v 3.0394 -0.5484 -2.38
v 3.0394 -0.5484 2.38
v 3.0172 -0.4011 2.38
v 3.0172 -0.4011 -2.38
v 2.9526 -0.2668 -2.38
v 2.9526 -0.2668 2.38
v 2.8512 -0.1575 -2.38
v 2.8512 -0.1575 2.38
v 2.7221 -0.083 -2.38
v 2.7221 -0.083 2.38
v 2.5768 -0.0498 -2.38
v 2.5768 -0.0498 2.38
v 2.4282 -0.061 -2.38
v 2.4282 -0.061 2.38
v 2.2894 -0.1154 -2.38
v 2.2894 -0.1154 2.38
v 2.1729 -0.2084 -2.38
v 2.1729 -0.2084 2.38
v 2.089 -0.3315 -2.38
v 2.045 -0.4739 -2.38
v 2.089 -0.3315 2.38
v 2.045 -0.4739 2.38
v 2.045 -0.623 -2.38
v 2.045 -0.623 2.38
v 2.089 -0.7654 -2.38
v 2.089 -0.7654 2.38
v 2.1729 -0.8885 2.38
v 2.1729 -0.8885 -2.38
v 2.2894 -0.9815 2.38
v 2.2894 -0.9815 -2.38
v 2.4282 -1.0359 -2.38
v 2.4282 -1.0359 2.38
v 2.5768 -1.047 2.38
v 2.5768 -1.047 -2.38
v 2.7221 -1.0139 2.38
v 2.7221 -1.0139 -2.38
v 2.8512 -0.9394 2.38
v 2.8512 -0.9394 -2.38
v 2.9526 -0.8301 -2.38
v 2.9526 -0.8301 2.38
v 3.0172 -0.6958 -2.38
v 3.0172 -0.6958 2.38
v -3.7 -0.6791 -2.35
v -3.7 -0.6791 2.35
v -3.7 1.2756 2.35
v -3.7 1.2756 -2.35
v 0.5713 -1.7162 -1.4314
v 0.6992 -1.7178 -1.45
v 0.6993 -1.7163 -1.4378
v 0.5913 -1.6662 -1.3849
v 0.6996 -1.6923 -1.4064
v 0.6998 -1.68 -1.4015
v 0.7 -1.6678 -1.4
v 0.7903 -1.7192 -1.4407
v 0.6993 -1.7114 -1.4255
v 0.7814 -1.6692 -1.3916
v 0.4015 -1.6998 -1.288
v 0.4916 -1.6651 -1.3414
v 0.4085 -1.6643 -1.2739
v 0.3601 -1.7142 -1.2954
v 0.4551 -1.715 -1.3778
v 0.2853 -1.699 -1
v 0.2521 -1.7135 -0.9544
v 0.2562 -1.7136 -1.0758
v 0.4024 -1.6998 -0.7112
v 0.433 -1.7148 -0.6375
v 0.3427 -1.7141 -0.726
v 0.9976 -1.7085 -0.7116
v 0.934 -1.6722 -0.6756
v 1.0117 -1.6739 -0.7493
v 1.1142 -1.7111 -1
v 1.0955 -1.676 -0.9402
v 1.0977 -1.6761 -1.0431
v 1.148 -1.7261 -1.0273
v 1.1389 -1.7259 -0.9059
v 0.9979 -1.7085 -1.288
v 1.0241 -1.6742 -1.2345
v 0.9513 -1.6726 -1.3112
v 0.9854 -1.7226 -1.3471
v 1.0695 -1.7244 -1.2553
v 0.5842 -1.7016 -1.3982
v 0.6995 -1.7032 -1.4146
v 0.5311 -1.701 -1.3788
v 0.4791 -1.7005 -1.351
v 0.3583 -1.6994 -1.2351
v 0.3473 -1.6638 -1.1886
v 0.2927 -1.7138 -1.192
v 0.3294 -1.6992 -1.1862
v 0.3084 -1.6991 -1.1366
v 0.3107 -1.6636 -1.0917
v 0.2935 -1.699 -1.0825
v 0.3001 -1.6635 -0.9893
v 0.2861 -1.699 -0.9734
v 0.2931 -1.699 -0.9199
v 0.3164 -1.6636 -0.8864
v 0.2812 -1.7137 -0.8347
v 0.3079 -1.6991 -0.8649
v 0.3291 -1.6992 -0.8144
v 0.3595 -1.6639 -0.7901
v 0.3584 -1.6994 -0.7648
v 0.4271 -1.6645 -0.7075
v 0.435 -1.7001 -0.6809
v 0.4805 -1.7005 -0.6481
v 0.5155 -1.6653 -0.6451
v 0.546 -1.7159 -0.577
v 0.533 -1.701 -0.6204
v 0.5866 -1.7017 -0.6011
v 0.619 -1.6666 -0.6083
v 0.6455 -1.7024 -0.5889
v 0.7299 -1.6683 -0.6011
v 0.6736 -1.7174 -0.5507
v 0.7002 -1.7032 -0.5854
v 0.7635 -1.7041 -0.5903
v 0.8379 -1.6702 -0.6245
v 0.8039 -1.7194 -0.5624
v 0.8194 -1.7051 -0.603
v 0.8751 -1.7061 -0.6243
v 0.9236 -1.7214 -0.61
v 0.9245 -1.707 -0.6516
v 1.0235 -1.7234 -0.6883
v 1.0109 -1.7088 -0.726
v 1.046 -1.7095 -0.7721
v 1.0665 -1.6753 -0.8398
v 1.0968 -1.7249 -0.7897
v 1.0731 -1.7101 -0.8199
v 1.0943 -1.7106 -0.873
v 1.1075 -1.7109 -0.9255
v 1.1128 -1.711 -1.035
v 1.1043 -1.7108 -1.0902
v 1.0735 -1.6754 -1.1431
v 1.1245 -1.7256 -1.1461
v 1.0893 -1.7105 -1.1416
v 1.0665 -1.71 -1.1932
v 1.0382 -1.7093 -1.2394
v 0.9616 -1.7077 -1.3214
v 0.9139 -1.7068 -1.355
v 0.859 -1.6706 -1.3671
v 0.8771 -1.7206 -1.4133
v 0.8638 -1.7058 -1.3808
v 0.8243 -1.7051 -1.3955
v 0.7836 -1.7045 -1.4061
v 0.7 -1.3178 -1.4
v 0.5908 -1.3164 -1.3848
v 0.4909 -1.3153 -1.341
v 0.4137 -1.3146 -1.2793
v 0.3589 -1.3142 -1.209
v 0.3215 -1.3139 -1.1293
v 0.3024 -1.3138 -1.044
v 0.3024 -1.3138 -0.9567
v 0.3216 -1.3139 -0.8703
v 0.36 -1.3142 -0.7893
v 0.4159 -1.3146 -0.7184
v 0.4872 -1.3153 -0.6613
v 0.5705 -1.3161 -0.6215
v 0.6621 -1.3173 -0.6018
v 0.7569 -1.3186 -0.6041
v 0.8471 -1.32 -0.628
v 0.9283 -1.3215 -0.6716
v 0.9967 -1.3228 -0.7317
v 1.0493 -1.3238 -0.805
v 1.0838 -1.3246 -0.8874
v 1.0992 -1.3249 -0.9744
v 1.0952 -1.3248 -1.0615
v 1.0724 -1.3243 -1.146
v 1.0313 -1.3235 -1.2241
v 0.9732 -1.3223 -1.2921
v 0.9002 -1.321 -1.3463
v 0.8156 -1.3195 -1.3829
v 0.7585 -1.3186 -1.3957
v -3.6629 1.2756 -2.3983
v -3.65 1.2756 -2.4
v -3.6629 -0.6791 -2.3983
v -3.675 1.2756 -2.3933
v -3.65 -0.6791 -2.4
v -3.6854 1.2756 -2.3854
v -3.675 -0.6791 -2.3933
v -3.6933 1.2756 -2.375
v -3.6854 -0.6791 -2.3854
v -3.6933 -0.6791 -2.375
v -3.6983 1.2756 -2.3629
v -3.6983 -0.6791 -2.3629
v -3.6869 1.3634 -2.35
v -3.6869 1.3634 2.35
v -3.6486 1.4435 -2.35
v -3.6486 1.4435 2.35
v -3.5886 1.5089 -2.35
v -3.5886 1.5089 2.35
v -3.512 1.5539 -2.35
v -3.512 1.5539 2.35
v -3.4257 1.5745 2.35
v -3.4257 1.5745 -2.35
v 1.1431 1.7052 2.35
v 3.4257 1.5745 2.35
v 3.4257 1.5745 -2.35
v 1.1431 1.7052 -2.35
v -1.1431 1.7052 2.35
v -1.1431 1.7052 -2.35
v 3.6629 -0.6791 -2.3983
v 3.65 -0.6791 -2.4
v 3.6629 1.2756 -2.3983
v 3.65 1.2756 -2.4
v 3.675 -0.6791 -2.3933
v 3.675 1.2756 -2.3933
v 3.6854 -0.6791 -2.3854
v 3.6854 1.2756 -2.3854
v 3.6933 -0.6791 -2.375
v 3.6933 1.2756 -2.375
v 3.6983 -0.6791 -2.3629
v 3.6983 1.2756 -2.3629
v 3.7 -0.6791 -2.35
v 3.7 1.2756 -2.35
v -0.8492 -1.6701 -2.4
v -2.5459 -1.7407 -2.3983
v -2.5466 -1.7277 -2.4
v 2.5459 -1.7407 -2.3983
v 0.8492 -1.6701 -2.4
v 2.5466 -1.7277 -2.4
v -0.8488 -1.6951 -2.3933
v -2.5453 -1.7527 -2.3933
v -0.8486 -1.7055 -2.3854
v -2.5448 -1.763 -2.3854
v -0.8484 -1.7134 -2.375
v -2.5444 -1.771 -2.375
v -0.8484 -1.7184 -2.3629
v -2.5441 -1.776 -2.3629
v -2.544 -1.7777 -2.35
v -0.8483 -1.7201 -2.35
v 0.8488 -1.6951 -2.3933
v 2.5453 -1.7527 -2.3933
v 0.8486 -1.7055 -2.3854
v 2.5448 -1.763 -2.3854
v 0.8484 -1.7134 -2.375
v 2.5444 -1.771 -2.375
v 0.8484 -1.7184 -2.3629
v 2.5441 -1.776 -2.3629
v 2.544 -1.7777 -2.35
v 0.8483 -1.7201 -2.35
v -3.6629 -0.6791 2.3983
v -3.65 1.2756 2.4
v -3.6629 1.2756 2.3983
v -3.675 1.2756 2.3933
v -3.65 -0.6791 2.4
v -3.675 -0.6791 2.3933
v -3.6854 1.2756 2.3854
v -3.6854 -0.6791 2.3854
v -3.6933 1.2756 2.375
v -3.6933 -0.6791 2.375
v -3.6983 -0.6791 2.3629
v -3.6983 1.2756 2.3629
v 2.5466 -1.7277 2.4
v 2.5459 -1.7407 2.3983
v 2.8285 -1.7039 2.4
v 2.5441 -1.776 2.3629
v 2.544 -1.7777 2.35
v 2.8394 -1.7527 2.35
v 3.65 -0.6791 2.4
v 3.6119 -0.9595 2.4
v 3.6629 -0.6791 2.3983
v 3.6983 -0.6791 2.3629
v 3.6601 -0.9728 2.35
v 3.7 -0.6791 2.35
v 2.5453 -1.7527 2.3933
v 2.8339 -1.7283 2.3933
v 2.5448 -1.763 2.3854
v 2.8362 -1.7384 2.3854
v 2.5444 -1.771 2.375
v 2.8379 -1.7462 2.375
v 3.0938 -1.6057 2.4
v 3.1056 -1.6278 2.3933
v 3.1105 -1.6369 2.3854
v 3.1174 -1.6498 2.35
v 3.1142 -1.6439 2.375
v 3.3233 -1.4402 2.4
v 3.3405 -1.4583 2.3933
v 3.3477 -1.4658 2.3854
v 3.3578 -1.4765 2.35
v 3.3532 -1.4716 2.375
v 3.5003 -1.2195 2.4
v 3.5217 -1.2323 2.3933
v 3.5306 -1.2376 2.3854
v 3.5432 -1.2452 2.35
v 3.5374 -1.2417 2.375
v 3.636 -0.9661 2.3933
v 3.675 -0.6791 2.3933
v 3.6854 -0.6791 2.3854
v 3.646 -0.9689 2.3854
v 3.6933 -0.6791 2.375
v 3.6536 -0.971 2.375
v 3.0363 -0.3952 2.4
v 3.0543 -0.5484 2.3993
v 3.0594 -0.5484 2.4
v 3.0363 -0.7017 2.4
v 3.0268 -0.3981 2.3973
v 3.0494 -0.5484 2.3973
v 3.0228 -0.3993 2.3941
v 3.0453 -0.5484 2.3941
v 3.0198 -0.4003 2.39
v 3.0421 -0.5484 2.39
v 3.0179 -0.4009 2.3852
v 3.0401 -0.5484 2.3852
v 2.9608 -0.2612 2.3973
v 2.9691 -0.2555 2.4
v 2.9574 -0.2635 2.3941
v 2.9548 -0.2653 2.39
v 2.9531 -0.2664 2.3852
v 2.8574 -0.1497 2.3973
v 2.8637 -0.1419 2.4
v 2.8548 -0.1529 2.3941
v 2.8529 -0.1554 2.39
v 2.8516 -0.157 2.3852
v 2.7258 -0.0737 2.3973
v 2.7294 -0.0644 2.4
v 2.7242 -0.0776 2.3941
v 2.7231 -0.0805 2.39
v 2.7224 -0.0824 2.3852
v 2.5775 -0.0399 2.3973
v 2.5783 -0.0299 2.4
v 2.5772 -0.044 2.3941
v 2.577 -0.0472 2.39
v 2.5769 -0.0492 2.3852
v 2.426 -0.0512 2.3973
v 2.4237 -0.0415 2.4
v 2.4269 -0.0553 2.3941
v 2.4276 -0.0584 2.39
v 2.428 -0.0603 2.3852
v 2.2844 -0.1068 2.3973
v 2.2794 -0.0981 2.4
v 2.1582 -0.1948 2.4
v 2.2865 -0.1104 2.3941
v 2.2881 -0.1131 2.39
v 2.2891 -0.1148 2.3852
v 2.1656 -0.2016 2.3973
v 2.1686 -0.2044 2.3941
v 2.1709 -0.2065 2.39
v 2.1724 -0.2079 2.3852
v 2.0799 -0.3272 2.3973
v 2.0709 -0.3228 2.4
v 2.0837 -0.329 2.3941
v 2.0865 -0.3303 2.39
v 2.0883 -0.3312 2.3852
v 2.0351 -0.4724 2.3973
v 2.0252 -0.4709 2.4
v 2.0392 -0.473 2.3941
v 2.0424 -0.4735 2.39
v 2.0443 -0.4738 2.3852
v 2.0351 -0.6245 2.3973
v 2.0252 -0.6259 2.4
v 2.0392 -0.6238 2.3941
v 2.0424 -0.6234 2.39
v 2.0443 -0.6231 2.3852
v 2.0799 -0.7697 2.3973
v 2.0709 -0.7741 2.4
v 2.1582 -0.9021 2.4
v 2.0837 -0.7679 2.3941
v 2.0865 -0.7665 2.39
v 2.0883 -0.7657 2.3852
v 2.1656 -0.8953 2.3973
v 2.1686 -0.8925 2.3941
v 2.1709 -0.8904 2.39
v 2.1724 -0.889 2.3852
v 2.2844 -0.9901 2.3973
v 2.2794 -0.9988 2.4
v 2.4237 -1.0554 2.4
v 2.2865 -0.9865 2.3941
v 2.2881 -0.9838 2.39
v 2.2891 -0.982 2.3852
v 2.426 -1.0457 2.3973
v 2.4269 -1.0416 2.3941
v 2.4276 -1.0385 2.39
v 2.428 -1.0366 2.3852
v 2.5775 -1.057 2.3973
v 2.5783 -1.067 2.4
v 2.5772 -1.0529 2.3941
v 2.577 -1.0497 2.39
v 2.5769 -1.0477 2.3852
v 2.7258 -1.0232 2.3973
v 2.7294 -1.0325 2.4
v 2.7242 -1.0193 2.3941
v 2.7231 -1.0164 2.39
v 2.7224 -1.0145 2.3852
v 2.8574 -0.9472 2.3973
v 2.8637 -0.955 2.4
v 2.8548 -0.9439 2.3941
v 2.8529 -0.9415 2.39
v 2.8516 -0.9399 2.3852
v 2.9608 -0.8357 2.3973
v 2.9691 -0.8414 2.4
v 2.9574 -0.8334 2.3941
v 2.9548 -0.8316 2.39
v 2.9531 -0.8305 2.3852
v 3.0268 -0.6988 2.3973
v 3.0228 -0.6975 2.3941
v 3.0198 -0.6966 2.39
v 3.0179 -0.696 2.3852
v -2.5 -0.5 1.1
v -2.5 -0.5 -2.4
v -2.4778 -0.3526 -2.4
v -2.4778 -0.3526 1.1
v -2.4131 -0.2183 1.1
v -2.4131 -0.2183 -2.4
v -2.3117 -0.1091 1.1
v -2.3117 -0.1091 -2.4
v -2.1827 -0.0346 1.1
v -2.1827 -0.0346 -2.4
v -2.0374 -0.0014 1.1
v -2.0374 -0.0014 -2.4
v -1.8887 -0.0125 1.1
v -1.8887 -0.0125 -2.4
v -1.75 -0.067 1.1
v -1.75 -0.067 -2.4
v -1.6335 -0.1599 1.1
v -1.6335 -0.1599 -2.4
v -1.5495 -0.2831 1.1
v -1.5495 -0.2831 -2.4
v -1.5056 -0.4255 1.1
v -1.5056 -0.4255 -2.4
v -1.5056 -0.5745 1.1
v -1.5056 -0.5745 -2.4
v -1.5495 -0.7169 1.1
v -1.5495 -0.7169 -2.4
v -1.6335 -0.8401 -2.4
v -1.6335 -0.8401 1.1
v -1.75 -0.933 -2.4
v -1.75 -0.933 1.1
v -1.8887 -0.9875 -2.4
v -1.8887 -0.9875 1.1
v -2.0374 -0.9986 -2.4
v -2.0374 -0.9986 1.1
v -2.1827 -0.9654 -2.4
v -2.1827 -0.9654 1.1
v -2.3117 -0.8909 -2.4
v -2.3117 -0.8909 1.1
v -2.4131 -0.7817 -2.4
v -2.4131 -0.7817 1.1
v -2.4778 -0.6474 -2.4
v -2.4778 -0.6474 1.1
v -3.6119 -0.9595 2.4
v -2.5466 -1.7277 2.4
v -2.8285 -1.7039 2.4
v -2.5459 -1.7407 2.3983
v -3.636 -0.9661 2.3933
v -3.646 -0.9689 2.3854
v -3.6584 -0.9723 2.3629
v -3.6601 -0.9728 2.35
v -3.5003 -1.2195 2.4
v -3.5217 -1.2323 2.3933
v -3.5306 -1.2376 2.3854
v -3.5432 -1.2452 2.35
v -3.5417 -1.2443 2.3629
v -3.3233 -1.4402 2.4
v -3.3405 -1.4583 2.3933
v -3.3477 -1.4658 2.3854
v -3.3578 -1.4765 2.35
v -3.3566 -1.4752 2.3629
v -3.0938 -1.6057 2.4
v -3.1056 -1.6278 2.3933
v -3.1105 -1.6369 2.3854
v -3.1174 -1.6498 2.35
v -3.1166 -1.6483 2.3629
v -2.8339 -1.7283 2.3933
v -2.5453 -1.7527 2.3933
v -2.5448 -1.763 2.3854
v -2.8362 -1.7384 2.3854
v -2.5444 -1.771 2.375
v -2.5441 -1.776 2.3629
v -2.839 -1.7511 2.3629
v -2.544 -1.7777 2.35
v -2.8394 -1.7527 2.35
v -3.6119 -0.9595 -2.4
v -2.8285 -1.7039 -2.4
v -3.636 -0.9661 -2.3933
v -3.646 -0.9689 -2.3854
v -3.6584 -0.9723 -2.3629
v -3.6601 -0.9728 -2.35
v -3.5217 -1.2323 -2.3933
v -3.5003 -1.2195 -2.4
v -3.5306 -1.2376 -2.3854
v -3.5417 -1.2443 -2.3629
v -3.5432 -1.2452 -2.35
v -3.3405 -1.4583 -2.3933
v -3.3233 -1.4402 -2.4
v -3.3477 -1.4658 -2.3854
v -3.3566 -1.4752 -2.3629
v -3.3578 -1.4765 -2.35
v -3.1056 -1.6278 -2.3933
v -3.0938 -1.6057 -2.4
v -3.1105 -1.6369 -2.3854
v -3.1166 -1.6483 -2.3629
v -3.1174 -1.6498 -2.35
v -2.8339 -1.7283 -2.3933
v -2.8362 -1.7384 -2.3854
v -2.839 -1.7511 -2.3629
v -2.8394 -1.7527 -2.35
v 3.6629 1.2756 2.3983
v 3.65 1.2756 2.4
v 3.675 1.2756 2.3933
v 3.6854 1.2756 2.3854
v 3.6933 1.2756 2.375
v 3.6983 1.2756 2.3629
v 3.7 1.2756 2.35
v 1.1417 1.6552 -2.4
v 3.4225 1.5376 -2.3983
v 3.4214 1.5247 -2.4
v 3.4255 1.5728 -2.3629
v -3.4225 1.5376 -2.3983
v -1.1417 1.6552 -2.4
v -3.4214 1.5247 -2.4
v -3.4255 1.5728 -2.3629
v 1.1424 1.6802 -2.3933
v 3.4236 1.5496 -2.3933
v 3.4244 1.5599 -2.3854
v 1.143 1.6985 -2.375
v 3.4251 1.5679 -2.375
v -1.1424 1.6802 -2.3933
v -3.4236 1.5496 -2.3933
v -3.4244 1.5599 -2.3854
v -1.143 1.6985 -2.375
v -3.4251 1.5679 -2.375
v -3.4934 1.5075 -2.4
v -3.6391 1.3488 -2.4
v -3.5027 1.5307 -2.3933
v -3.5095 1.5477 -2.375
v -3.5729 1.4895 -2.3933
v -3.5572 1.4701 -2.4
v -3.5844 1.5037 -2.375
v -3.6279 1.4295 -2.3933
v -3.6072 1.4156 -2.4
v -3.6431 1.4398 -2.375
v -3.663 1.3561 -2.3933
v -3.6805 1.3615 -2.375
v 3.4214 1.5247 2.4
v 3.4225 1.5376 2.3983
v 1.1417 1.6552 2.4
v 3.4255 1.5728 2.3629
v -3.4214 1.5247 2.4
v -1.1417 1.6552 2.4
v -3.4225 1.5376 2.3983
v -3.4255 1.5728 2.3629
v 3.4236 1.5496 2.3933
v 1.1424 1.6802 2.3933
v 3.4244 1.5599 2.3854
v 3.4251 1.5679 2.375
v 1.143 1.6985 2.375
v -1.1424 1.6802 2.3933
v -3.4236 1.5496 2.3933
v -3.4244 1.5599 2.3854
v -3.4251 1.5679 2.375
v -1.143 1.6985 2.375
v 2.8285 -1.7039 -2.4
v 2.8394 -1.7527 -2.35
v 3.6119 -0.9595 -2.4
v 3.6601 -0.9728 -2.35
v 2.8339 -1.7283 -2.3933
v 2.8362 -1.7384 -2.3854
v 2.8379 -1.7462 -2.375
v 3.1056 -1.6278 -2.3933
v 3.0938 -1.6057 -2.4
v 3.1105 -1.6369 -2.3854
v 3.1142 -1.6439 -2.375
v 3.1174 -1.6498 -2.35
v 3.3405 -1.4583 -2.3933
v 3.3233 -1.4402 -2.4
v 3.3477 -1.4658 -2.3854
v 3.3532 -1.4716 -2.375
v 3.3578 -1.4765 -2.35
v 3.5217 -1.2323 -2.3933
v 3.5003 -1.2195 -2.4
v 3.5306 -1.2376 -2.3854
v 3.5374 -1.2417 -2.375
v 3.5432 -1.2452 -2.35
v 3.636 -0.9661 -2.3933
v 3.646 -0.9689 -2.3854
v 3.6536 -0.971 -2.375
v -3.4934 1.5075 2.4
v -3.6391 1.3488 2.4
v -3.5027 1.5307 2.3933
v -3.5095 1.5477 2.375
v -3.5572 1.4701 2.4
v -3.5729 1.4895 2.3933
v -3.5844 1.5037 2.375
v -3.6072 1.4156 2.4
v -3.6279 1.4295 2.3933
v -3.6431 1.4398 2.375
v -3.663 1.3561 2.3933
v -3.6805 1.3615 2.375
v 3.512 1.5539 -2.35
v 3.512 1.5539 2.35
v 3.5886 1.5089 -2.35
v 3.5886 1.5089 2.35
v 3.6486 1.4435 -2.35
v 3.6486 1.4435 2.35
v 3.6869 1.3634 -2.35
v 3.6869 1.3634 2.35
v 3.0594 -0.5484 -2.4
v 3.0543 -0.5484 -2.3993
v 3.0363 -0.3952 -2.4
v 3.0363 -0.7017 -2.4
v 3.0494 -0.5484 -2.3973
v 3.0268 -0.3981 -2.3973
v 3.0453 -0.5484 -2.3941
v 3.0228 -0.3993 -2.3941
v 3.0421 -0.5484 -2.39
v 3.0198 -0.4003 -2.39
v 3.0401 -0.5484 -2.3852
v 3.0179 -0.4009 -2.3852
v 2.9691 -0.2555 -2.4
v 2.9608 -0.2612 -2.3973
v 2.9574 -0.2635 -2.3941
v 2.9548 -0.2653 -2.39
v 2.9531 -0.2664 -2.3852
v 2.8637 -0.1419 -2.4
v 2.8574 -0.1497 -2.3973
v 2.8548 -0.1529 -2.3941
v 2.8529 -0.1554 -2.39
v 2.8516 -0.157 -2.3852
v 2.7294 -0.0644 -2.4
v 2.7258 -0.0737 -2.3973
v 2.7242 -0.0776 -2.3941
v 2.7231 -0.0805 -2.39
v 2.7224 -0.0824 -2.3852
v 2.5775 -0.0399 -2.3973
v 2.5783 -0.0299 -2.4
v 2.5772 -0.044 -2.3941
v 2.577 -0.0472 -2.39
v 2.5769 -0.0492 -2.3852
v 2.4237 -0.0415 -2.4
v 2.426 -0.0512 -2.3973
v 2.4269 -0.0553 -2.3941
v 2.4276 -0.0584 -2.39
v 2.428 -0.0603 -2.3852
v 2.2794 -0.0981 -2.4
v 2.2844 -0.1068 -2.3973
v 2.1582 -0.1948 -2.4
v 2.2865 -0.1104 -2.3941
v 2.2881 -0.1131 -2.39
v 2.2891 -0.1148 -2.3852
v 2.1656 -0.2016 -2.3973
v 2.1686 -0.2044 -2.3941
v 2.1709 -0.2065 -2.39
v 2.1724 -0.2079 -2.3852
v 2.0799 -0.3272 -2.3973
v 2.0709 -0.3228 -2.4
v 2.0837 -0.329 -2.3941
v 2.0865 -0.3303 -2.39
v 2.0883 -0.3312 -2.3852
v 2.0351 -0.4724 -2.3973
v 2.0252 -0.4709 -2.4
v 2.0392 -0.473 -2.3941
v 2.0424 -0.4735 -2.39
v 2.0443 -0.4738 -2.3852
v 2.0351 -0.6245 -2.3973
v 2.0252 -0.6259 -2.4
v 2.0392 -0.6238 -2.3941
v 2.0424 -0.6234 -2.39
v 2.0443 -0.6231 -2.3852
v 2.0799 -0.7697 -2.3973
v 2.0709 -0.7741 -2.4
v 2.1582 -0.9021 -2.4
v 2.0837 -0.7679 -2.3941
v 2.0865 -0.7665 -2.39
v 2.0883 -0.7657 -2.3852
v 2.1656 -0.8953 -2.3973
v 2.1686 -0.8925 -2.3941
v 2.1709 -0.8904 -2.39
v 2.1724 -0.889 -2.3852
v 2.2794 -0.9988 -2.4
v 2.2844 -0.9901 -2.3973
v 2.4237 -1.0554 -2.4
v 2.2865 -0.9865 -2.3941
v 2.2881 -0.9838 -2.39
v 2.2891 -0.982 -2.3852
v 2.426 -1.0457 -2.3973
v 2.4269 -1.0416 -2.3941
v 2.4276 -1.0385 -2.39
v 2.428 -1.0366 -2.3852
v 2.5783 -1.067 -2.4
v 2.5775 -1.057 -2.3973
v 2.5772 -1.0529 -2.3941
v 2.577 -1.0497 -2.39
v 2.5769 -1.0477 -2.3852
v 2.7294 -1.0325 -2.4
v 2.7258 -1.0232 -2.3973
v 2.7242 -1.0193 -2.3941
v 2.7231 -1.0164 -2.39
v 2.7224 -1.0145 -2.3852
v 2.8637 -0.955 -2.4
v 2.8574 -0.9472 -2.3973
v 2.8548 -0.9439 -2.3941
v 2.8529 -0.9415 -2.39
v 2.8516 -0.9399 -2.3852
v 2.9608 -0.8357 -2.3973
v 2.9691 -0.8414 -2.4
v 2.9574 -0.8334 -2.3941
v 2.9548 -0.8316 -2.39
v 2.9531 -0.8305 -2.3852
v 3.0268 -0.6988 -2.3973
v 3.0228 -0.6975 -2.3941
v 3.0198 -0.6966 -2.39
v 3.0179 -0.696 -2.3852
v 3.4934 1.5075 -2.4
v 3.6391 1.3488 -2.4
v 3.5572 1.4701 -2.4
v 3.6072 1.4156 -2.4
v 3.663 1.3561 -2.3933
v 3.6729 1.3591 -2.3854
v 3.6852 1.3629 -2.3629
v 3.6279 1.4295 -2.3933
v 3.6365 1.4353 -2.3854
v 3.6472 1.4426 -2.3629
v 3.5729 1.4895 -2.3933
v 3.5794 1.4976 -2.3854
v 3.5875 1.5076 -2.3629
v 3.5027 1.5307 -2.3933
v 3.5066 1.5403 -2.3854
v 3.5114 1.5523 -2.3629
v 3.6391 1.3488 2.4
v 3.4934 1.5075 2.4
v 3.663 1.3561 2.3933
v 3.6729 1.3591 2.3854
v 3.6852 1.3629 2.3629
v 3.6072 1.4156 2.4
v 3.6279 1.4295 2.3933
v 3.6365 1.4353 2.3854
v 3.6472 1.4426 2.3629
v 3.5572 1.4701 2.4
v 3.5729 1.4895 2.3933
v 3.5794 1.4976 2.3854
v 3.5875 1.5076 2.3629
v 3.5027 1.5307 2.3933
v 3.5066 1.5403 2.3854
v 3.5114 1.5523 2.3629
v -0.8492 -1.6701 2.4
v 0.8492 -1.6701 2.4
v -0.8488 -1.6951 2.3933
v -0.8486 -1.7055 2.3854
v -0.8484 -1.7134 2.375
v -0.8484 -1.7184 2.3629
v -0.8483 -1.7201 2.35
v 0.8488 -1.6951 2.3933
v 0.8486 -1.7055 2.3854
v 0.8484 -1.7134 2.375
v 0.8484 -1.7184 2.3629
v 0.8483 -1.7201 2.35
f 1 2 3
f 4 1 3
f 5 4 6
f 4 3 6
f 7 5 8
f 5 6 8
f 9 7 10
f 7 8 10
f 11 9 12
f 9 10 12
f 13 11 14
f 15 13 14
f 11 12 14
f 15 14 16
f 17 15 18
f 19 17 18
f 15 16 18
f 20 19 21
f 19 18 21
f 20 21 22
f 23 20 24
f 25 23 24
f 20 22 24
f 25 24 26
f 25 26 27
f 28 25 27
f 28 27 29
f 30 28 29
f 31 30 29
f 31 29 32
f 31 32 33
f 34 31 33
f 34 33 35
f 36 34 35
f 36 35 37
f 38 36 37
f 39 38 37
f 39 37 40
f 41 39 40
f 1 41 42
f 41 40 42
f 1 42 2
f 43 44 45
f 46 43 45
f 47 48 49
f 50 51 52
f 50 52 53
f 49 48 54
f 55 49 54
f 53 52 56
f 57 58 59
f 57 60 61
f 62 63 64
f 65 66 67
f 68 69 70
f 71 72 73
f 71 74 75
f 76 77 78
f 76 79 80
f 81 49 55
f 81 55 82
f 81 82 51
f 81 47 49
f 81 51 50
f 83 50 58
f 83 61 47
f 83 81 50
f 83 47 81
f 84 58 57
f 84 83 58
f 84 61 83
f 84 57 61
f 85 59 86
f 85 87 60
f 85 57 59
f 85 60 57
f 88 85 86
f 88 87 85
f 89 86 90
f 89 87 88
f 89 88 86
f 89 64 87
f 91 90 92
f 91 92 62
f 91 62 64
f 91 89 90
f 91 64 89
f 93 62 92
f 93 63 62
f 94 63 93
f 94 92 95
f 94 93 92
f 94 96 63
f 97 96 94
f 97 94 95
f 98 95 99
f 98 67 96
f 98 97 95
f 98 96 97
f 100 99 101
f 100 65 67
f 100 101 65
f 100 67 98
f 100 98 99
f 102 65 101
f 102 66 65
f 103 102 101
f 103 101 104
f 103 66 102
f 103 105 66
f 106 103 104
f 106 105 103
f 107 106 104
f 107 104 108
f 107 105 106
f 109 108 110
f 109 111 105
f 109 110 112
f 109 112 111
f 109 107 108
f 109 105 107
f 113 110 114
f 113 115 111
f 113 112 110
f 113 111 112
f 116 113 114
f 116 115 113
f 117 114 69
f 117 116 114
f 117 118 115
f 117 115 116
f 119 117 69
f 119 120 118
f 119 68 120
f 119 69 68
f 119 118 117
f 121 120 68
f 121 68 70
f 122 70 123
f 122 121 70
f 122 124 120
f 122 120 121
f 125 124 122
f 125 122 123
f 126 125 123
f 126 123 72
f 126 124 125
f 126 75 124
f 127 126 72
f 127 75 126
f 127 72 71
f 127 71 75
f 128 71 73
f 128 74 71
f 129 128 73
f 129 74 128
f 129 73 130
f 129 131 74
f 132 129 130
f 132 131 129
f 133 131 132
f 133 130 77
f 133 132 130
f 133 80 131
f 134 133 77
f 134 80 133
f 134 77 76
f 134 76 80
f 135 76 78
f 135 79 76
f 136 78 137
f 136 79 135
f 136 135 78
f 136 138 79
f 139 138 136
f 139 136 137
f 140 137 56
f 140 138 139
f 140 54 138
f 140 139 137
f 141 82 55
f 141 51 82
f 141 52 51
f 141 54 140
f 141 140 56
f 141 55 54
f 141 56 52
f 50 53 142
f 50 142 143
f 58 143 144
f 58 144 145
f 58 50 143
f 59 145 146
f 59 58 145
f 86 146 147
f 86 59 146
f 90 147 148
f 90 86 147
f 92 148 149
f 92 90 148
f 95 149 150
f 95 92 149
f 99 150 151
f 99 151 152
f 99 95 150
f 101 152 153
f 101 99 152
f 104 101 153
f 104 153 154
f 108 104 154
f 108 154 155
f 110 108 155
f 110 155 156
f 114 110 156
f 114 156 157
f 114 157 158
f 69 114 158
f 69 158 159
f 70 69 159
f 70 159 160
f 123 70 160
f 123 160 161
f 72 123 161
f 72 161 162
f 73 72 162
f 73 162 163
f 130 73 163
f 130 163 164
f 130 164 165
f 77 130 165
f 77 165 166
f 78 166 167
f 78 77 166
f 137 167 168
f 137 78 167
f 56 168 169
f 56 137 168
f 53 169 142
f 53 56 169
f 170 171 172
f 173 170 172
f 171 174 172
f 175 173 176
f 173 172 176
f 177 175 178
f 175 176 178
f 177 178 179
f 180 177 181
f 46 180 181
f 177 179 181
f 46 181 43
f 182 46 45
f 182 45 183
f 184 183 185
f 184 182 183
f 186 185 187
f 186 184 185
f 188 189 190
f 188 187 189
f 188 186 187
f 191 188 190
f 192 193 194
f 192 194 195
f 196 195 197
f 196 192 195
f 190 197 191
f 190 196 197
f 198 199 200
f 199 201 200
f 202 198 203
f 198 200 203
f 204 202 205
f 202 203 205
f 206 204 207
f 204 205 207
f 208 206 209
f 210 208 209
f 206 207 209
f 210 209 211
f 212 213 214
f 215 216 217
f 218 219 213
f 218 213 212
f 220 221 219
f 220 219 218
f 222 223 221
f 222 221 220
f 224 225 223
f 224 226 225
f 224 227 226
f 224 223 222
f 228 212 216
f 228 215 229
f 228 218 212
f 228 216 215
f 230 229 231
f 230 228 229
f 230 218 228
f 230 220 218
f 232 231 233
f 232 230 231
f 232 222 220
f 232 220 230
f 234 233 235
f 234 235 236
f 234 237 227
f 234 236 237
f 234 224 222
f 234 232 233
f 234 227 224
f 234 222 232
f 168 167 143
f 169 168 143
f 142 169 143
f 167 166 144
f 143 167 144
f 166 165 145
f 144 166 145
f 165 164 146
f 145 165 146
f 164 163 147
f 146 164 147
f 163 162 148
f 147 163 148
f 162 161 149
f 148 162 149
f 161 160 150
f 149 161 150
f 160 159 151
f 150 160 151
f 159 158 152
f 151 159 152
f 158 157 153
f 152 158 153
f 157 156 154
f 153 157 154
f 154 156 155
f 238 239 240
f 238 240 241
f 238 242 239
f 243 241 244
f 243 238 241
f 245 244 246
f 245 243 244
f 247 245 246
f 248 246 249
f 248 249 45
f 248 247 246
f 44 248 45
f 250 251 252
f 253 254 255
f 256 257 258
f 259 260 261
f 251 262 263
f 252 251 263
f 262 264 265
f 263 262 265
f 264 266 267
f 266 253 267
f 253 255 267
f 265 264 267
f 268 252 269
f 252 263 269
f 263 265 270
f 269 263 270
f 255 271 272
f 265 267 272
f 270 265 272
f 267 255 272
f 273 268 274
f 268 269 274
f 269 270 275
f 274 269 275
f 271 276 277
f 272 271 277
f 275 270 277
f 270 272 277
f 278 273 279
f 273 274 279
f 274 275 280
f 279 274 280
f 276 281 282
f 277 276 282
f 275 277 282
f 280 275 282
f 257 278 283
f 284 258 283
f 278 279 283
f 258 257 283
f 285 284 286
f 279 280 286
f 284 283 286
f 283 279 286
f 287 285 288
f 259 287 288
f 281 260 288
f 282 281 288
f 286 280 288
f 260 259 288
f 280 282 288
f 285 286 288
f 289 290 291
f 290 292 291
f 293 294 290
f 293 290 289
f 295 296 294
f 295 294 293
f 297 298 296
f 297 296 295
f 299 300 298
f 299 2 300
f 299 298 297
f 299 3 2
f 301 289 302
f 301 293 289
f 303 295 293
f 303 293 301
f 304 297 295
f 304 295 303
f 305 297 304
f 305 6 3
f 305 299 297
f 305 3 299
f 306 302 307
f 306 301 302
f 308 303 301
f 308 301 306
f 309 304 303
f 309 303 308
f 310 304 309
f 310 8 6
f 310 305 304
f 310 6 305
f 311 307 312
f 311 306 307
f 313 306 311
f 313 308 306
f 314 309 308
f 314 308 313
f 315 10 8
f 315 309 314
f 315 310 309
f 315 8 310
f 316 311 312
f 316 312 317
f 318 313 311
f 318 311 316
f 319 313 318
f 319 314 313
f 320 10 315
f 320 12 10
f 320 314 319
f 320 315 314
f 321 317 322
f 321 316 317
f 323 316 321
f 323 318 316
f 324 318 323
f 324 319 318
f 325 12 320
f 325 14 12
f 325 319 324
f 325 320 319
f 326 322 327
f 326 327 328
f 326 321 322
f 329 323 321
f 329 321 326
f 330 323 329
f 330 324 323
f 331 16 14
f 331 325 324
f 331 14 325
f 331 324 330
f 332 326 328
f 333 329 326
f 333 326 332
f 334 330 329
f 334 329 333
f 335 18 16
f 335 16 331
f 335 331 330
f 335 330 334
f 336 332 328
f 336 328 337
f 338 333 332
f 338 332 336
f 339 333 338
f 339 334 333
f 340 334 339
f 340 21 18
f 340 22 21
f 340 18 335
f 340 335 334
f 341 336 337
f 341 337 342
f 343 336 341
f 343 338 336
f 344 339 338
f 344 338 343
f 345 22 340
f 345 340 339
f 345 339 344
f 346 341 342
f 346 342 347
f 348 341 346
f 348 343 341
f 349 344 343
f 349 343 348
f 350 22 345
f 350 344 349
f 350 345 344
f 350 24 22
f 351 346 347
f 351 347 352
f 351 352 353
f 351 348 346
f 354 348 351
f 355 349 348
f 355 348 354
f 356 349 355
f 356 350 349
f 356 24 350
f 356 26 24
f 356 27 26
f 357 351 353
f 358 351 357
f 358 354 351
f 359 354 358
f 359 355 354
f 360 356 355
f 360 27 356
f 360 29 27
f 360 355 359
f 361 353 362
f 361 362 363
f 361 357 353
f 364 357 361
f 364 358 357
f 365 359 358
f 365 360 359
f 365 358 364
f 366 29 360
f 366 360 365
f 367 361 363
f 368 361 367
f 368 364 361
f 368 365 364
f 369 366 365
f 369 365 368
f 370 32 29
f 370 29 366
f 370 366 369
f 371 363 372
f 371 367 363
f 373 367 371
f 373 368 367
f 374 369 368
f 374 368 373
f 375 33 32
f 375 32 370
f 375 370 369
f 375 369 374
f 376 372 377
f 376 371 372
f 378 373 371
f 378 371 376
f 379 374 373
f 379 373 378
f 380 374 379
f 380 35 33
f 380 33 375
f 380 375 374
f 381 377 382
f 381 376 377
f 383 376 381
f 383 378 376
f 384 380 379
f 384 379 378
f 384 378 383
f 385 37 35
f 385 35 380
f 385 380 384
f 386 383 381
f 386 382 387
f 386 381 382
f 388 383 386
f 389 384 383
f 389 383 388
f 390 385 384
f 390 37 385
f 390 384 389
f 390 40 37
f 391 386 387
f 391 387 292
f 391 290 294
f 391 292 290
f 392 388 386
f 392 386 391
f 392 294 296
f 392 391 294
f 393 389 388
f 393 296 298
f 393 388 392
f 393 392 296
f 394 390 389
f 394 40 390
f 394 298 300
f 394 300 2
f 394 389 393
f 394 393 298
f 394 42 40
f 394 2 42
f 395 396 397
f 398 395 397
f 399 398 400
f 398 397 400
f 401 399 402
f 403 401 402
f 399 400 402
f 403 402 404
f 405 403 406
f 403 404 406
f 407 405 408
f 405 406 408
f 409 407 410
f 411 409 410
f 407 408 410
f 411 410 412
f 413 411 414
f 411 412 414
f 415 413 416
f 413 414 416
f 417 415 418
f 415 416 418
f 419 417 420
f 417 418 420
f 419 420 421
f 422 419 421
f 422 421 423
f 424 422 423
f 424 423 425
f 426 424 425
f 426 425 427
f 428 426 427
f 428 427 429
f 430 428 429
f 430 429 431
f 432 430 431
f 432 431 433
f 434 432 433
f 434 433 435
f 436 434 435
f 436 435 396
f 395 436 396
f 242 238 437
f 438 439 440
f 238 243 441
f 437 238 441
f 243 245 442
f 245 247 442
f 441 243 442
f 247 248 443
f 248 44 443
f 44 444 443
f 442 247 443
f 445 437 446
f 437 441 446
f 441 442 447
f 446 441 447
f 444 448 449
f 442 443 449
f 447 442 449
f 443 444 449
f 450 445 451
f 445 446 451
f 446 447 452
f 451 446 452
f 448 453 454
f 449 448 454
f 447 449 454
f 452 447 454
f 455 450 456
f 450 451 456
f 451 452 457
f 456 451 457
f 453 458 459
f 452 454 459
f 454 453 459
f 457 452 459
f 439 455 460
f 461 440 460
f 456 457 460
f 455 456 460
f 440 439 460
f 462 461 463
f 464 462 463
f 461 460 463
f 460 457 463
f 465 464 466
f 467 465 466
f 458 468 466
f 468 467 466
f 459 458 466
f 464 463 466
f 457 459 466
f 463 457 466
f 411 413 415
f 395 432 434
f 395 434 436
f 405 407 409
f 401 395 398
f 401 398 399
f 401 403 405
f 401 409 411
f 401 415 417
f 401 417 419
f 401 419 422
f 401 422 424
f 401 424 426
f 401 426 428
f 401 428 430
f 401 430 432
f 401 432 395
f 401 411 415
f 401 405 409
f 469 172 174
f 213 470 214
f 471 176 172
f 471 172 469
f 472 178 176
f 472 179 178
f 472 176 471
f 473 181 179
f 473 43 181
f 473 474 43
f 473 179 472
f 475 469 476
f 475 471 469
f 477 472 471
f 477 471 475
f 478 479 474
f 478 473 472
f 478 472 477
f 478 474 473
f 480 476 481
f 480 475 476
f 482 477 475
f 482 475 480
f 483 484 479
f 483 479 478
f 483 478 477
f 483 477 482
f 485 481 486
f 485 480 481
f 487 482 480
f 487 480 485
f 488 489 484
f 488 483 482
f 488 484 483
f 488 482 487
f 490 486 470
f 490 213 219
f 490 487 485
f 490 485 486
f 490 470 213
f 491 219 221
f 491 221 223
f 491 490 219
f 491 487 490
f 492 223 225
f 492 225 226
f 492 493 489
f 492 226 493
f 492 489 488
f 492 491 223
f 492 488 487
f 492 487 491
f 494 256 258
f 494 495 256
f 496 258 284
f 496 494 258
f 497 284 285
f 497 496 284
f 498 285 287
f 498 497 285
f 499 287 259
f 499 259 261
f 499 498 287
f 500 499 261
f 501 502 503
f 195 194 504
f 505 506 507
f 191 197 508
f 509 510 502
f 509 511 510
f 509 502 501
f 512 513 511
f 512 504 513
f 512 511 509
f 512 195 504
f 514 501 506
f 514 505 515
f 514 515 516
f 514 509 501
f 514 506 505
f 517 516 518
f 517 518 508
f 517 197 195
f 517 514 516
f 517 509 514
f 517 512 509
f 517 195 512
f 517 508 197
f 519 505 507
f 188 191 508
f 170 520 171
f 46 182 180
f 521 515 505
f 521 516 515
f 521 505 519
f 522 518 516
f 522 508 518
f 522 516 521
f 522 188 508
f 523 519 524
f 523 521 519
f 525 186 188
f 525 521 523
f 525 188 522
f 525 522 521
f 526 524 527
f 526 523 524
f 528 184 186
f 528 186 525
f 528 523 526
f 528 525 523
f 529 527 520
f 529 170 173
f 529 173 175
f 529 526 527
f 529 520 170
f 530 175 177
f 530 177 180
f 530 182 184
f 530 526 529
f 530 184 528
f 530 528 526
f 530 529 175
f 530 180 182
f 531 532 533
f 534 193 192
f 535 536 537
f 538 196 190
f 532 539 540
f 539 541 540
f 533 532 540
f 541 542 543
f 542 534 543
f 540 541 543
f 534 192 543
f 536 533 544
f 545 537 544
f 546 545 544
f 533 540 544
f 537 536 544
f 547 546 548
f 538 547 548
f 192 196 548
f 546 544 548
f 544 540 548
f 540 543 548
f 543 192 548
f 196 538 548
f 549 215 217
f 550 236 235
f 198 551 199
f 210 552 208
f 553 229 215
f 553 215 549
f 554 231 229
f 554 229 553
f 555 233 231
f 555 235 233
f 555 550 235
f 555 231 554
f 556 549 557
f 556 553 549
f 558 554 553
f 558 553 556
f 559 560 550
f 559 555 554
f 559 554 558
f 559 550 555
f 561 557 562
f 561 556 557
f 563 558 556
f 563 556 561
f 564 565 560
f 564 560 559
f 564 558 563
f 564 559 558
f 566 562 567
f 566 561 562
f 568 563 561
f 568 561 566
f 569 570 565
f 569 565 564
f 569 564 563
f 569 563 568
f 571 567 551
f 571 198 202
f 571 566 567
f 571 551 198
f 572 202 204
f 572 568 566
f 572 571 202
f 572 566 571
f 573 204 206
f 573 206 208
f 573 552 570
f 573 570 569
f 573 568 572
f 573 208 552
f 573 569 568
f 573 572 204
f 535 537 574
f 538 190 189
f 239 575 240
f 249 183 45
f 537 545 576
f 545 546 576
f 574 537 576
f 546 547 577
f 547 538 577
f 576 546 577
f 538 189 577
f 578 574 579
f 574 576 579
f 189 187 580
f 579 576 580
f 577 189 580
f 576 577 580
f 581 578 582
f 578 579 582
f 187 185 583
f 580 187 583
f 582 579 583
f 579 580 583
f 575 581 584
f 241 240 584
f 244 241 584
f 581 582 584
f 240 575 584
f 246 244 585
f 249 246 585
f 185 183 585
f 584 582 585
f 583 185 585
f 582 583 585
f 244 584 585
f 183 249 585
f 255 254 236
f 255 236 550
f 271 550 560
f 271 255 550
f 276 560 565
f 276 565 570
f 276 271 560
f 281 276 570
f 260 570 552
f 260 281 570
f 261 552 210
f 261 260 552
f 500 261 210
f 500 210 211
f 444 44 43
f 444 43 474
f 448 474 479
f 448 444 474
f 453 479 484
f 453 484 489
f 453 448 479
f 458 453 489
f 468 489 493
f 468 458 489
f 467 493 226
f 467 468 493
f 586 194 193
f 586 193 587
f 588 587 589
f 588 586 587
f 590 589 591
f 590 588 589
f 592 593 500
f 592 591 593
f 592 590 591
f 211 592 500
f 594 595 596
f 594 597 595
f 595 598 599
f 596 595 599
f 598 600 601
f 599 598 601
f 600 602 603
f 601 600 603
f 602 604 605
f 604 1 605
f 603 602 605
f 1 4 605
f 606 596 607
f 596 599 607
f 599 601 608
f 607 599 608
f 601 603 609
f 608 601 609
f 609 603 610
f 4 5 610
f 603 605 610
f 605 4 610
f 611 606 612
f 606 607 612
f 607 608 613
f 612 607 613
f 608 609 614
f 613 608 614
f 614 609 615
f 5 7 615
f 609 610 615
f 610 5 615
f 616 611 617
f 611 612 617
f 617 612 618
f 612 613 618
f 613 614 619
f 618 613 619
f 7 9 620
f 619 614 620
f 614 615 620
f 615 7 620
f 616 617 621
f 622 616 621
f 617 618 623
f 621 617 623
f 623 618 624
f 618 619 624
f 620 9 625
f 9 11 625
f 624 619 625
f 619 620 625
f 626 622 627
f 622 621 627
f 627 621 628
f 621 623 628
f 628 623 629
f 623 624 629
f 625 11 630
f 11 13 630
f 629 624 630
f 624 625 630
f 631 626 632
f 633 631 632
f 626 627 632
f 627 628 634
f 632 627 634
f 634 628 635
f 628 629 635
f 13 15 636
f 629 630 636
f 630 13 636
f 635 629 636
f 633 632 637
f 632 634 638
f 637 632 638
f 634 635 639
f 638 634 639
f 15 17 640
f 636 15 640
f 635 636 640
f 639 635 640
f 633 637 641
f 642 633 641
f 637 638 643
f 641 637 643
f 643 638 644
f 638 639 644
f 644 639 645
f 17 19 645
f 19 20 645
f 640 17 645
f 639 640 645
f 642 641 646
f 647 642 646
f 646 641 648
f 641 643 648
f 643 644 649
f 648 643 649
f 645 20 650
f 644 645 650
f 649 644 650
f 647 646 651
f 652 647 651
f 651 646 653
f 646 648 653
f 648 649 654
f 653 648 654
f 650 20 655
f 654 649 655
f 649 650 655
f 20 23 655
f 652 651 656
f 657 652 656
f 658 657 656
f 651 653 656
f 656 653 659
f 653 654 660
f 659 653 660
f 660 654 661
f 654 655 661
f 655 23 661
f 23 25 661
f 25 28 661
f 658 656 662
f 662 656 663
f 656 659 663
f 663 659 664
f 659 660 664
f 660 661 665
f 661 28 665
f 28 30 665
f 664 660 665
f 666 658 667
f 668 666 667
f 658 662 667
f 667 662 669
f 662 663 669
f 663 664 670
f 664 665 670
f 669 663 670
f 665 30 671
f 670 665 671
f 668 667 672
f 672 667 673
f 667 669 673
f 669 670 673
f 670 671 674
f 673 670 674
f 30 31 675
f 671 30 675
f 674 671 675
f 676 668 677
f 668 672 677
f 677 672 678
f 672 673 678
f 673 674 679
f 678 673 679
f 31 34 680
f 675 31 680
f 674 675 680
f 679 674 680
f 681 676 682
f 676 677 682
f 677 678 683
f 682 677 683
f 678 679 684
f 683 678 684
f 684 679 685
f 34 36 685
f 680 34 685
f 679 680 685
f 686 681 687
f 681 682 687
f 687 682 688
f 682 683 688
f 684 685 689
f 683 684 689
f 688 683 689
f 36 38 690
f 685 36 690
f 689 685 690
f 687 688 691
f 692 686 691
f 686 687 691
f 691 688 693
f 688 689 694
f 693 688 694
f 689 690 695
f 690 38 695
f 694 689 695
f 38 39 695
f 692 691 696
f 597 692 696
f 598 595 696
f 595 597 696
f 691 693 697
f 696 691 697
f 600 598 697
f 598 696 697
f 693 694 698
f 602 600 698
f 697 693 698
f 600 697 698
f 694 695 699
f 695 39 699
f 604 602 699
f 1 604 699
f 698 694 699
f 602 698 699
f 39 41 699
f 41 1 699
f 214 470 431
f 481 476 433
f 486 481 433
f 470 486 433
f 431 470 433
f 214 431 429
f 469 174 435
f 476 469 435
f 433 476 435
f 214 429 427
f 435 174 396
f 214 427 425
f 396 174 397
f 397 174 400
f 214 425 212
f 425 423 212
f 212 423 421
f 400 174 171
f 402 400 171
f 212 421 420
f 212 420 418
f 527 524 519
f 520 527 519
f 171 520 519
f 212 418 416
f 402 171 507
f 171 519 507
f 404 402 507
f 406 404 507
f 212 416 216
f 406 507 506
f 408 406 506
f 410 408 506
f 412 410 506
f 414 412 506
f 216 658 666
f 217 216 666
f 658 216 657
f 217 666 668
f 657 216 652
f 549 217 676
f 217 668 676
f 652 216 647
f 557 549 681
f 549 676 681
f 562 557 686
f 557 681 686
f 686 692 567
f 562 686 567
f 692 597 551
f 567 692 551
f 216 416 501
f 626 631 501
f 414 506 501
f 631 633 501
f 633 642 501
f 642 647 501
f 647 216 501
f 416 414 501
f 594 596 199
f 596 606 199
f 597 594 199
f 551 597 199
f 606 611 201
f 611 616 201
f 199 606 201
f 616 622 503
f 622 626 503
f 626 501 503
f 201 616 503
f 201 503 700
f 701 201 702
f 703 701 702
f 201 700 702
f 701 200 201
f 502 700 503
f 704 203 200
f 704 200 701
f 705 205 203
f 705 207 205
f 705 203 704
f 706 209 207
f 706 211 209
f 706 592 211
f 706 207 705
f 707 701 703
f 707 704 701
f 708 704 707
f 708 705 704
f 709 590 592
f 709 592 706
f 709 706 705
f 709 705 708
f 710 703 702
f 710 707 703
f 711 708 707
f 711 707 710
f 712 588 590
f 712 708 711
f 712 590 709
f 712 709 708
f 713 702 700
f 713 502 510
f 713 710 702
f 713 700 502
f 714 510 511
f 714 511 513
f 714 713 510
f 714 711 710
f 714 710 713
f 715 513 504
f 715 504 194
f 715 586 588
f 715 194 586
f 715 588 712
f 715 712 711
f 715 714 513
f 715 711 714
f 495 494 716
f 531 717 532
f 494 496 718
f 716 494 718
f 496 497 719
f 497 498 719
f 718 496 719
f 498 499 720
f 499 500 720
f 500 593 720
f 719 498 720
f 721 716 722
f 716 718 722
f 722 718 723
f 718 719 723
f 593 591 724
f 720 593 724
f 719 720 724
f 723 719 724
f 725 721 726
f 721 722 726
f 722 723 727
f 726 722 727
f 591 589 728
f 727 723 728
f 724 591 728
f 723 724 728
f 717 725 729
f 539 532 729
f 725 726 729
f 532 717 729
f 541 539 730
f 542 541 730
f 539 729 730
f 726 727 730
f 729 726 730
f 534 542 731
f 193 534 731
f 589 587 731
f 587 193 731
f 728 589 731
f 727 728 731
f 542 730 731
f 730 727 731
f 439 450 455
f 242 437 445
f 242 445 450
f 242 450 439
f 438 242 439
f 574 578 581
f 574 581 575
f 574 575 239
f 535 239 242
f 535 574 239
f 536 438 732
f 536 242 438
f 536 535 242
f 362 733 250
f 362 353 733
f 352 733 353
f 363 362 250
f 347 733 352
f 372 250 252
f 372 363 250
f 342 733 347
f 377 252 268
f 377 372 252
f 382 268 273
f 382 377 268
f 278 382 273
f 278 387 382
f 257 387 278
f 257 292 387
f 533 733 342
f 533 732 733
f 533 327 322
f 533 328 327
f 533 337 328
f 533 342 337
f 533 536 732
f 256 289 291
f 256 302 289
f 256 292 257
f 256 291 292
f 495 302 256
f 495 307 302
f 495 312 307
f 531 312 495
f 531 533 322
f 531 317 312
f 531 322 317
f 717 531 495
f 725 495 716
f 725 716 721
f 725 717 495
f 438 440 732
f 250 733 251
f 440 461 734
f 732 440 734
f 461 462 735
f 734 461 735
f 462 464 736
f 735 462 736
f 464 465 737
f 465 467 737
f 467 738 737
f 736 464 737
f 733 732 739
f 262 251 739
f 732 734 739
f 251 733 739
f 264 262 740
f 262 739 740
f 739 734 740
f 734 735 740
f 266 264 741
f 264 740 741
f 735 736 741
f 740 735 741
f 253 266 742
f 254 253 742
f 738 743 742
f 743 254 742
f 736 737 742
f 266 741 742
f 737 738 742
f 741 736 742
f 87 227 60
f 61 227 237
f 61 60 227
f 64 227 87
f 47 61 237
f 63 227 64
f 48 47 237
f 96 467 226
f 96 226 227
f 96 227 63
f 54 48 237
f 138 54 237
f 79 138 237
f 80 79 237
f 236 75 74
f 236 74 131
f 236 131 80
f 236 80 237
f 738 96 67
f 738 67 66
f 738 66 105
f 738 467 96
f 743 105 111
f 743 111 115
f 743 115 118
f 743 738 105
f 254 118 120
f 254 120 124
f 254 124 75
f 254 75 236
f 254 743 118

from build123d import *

# Parameters (mm, degrees)
SKETCH1_W               = 7.4
SKETCH1_H               = 3.7
BOSS_EXTRUDE1_DEPTH     = 2.4
CUT_EXTRUDE1_DEPTH      = 4.8
FILLET1_R               = 1.1
FILLET2_R               = 0.3
FILLET3_R               = 0.05
CUT_EXTRUDE2_START      = -1
SKETCH3_R               = 0.5
CUT_EXTRUDE2_DEPTH      = 7.4
FILLET4_R               = 0.02
CUT_EXTRUDE3_START      = 1
SKETCH4_R               = 0.5
CUT_EXTRUDE3_DEPTH      = 4.5
CUT_EXTRUDE4_REACH      = 16.756
CUT_EXTRUDE4_END_RADIUS = 50.4
CUT_EXTRUDE4_START      = -10
SKETCH5_R               = 0.4
FILLET5_R               = 0.05


with BuildPart() as part:
    # Sketch1 → Boss-Extrude1 (new, symmetric)
    with BuildSketch(Plane.XY):
        Rectangle(SKETCH1_W, SKETCH1_H)
    extrude(amount=BOSS_EXTRUDE1_DEPTH, both=True)

    # Sketch2 → Cut-Extrude1 (cut)
    with BuildSketch(Plane.XY.offset(2.4)):
        with BuildLine():
            Line((-3.7, 1.55), (-7.120690005, 4.011417256))
            Line((-7.120690005, 4.011417256), (5.535860742, 3.886722174))
            Line((5.535860742, 3.886722174), (3.7, 1.55))
            ThreePointArc((3.7, 1.55), (0, 1.721492621), (-3.7, 1.55))
        make_face()
        with BuildLine():
            Line((3.7, -1.85), (0.350623614, -3.782025322))
            Line((0.350623614, -3.782025322), (-3.7, -1.85))
            ThreePointArc((-3.7, -1.85), (0, -1.712912069), (3.7, -1.85))
        make_face()
    extrude(amount=-CUT_EXTRUDE1_DEPTH, mode=Mode.SUBTRACT)

    # Fillet1
    fillet1_edges = [part.edges().sort_by_distance(p)[0] for p in [
        (3.7, -1.85, 0),
        (-3.7, -1.85, 0),
    ]]
    fillet(fillet1_edges, radius=FILLET1_R)

    # Fillet2
    fillet2_edges = [part.edges().sort_by_distance(p)[0] for p in [
        (3.7, 1.55, 0),
        (-3.7, 1.55, 0),
    ]]
    fillet(fillet2_edges, radius=FILLET2_R)

    # Fillet3
    fillet3_edges = [part.edges().sort_by_distance(p)[0] for p in [
        (3.7, 0.298266493, -2.4),
        (3.7, 0.298266493, 2.4),
        (0, -1.712912069, -2.4),
        (-3.35777122, -1.476459629, -2.4),
        (3.35777122, -1.476459629, -2.4),
        (0, -1.712912069, 2.4),
        (-3.35777122, -1.476459629, 2.4),
        (3.35777122, -1.476459629, 2.4),
        (0, 1.721492621, 2.4),
        (-3.7, 0.298266493, 2.4),
        (-3.621029193, 1.478477738, 2.4),
        (3.621029193, 1.478477738, 2.4),
        (0, 1.721492621, -2.4),
        (-3.7, 0.298266493, -2.4),
        (-3.621029193, 1.478477738, -2.4),
        (3.621029193, 1.478477738, -2.4),
    ]]
    fillet(fillet3_edges, radius=FILLET3_R)

    # Sketch3 → Cut-Extrude2 (cut, symmetric)
    with BuildSketch(Plane.XY.offset(2.4).offset(CUT_EXTRUDE2_START)):
        with Locations((2.539436079, -0.548443568)):
            Circle(SKETCH3_R)
    extrude(amount=CUT_EXTRUDE2_DEPTH, both=True, mode=Mode.SUBTRACT)

    # Fillet4
    fillet4_edges = [part.edges().sort_by_distance(p)[0] for p in [
        (2.039436079, -0.548443568, 2.4),
        (2.039436079, -0.548443568, -2.4),
    ]]
    fillet(fillet4_edges, radius=FILLET4_R)

    # Sketch4 → Cut-Extrude3 (cut)
    with BuildSketch(Plane(origin=(0, 0, -2.4), x_dir=(-1, 0, 0), z_dir=(0, 0, -1)).offset(CUT_EXTRUDE3_START)):
        with Locations((2, -0.5)):
            Circle(SKETCH4_R)
    extrude(amount=-CUT_EXTRUDE3_DEPTH, mode=Mode.SUBTRACT)

    # Cut-Extrude4: up to this cylinder (the profile starts inside it)
    cut_extrude4_end = Plane(origin=(0, -51.712912069, -1), z_dir=(0, 0, 1)) * Cylinder(CUT_EXTRUDE4_END_RADIUS, 135.312, mode=Mode.PRIVATE)
    # Sketch5 → Cut-Extrude4 (cut, up to the surface)
    with BuildSketch(Plane(origin=(0, 0, 0), x_dir=(1, 0, 0), z_dir=(0, 1, 0)).offset(CUT_EXTRUDE4_START), mode=Mode.PRIVATE) as cut_extrude4_sk1:
        with Locations(Location((0.7, 1, 0), (0, 0, 90))):
            Circle(SKETCH5_R)
    cut_extrude4_tool1 = extrude(cut_extrude4_sk1.sketch, amount=CUT_EXTRUDE4_REACH, mode=Mode.PRIVATE) & cut_extrude4_end
    add(cut_extrude4_tool1.solids().sort_by_distance((0.7, -10, -1))[0], mode=Mode.SUBTRACT)

    # Fillet5
    fillet5_edges = [part.edges().sort_by_distance(p)[0] for p in [
        (0.700029875, -1.717812727, -0.600000001),
    ]]
    fillet(fillet5_edges, radius=FILLET5_R)


solid = part.part
